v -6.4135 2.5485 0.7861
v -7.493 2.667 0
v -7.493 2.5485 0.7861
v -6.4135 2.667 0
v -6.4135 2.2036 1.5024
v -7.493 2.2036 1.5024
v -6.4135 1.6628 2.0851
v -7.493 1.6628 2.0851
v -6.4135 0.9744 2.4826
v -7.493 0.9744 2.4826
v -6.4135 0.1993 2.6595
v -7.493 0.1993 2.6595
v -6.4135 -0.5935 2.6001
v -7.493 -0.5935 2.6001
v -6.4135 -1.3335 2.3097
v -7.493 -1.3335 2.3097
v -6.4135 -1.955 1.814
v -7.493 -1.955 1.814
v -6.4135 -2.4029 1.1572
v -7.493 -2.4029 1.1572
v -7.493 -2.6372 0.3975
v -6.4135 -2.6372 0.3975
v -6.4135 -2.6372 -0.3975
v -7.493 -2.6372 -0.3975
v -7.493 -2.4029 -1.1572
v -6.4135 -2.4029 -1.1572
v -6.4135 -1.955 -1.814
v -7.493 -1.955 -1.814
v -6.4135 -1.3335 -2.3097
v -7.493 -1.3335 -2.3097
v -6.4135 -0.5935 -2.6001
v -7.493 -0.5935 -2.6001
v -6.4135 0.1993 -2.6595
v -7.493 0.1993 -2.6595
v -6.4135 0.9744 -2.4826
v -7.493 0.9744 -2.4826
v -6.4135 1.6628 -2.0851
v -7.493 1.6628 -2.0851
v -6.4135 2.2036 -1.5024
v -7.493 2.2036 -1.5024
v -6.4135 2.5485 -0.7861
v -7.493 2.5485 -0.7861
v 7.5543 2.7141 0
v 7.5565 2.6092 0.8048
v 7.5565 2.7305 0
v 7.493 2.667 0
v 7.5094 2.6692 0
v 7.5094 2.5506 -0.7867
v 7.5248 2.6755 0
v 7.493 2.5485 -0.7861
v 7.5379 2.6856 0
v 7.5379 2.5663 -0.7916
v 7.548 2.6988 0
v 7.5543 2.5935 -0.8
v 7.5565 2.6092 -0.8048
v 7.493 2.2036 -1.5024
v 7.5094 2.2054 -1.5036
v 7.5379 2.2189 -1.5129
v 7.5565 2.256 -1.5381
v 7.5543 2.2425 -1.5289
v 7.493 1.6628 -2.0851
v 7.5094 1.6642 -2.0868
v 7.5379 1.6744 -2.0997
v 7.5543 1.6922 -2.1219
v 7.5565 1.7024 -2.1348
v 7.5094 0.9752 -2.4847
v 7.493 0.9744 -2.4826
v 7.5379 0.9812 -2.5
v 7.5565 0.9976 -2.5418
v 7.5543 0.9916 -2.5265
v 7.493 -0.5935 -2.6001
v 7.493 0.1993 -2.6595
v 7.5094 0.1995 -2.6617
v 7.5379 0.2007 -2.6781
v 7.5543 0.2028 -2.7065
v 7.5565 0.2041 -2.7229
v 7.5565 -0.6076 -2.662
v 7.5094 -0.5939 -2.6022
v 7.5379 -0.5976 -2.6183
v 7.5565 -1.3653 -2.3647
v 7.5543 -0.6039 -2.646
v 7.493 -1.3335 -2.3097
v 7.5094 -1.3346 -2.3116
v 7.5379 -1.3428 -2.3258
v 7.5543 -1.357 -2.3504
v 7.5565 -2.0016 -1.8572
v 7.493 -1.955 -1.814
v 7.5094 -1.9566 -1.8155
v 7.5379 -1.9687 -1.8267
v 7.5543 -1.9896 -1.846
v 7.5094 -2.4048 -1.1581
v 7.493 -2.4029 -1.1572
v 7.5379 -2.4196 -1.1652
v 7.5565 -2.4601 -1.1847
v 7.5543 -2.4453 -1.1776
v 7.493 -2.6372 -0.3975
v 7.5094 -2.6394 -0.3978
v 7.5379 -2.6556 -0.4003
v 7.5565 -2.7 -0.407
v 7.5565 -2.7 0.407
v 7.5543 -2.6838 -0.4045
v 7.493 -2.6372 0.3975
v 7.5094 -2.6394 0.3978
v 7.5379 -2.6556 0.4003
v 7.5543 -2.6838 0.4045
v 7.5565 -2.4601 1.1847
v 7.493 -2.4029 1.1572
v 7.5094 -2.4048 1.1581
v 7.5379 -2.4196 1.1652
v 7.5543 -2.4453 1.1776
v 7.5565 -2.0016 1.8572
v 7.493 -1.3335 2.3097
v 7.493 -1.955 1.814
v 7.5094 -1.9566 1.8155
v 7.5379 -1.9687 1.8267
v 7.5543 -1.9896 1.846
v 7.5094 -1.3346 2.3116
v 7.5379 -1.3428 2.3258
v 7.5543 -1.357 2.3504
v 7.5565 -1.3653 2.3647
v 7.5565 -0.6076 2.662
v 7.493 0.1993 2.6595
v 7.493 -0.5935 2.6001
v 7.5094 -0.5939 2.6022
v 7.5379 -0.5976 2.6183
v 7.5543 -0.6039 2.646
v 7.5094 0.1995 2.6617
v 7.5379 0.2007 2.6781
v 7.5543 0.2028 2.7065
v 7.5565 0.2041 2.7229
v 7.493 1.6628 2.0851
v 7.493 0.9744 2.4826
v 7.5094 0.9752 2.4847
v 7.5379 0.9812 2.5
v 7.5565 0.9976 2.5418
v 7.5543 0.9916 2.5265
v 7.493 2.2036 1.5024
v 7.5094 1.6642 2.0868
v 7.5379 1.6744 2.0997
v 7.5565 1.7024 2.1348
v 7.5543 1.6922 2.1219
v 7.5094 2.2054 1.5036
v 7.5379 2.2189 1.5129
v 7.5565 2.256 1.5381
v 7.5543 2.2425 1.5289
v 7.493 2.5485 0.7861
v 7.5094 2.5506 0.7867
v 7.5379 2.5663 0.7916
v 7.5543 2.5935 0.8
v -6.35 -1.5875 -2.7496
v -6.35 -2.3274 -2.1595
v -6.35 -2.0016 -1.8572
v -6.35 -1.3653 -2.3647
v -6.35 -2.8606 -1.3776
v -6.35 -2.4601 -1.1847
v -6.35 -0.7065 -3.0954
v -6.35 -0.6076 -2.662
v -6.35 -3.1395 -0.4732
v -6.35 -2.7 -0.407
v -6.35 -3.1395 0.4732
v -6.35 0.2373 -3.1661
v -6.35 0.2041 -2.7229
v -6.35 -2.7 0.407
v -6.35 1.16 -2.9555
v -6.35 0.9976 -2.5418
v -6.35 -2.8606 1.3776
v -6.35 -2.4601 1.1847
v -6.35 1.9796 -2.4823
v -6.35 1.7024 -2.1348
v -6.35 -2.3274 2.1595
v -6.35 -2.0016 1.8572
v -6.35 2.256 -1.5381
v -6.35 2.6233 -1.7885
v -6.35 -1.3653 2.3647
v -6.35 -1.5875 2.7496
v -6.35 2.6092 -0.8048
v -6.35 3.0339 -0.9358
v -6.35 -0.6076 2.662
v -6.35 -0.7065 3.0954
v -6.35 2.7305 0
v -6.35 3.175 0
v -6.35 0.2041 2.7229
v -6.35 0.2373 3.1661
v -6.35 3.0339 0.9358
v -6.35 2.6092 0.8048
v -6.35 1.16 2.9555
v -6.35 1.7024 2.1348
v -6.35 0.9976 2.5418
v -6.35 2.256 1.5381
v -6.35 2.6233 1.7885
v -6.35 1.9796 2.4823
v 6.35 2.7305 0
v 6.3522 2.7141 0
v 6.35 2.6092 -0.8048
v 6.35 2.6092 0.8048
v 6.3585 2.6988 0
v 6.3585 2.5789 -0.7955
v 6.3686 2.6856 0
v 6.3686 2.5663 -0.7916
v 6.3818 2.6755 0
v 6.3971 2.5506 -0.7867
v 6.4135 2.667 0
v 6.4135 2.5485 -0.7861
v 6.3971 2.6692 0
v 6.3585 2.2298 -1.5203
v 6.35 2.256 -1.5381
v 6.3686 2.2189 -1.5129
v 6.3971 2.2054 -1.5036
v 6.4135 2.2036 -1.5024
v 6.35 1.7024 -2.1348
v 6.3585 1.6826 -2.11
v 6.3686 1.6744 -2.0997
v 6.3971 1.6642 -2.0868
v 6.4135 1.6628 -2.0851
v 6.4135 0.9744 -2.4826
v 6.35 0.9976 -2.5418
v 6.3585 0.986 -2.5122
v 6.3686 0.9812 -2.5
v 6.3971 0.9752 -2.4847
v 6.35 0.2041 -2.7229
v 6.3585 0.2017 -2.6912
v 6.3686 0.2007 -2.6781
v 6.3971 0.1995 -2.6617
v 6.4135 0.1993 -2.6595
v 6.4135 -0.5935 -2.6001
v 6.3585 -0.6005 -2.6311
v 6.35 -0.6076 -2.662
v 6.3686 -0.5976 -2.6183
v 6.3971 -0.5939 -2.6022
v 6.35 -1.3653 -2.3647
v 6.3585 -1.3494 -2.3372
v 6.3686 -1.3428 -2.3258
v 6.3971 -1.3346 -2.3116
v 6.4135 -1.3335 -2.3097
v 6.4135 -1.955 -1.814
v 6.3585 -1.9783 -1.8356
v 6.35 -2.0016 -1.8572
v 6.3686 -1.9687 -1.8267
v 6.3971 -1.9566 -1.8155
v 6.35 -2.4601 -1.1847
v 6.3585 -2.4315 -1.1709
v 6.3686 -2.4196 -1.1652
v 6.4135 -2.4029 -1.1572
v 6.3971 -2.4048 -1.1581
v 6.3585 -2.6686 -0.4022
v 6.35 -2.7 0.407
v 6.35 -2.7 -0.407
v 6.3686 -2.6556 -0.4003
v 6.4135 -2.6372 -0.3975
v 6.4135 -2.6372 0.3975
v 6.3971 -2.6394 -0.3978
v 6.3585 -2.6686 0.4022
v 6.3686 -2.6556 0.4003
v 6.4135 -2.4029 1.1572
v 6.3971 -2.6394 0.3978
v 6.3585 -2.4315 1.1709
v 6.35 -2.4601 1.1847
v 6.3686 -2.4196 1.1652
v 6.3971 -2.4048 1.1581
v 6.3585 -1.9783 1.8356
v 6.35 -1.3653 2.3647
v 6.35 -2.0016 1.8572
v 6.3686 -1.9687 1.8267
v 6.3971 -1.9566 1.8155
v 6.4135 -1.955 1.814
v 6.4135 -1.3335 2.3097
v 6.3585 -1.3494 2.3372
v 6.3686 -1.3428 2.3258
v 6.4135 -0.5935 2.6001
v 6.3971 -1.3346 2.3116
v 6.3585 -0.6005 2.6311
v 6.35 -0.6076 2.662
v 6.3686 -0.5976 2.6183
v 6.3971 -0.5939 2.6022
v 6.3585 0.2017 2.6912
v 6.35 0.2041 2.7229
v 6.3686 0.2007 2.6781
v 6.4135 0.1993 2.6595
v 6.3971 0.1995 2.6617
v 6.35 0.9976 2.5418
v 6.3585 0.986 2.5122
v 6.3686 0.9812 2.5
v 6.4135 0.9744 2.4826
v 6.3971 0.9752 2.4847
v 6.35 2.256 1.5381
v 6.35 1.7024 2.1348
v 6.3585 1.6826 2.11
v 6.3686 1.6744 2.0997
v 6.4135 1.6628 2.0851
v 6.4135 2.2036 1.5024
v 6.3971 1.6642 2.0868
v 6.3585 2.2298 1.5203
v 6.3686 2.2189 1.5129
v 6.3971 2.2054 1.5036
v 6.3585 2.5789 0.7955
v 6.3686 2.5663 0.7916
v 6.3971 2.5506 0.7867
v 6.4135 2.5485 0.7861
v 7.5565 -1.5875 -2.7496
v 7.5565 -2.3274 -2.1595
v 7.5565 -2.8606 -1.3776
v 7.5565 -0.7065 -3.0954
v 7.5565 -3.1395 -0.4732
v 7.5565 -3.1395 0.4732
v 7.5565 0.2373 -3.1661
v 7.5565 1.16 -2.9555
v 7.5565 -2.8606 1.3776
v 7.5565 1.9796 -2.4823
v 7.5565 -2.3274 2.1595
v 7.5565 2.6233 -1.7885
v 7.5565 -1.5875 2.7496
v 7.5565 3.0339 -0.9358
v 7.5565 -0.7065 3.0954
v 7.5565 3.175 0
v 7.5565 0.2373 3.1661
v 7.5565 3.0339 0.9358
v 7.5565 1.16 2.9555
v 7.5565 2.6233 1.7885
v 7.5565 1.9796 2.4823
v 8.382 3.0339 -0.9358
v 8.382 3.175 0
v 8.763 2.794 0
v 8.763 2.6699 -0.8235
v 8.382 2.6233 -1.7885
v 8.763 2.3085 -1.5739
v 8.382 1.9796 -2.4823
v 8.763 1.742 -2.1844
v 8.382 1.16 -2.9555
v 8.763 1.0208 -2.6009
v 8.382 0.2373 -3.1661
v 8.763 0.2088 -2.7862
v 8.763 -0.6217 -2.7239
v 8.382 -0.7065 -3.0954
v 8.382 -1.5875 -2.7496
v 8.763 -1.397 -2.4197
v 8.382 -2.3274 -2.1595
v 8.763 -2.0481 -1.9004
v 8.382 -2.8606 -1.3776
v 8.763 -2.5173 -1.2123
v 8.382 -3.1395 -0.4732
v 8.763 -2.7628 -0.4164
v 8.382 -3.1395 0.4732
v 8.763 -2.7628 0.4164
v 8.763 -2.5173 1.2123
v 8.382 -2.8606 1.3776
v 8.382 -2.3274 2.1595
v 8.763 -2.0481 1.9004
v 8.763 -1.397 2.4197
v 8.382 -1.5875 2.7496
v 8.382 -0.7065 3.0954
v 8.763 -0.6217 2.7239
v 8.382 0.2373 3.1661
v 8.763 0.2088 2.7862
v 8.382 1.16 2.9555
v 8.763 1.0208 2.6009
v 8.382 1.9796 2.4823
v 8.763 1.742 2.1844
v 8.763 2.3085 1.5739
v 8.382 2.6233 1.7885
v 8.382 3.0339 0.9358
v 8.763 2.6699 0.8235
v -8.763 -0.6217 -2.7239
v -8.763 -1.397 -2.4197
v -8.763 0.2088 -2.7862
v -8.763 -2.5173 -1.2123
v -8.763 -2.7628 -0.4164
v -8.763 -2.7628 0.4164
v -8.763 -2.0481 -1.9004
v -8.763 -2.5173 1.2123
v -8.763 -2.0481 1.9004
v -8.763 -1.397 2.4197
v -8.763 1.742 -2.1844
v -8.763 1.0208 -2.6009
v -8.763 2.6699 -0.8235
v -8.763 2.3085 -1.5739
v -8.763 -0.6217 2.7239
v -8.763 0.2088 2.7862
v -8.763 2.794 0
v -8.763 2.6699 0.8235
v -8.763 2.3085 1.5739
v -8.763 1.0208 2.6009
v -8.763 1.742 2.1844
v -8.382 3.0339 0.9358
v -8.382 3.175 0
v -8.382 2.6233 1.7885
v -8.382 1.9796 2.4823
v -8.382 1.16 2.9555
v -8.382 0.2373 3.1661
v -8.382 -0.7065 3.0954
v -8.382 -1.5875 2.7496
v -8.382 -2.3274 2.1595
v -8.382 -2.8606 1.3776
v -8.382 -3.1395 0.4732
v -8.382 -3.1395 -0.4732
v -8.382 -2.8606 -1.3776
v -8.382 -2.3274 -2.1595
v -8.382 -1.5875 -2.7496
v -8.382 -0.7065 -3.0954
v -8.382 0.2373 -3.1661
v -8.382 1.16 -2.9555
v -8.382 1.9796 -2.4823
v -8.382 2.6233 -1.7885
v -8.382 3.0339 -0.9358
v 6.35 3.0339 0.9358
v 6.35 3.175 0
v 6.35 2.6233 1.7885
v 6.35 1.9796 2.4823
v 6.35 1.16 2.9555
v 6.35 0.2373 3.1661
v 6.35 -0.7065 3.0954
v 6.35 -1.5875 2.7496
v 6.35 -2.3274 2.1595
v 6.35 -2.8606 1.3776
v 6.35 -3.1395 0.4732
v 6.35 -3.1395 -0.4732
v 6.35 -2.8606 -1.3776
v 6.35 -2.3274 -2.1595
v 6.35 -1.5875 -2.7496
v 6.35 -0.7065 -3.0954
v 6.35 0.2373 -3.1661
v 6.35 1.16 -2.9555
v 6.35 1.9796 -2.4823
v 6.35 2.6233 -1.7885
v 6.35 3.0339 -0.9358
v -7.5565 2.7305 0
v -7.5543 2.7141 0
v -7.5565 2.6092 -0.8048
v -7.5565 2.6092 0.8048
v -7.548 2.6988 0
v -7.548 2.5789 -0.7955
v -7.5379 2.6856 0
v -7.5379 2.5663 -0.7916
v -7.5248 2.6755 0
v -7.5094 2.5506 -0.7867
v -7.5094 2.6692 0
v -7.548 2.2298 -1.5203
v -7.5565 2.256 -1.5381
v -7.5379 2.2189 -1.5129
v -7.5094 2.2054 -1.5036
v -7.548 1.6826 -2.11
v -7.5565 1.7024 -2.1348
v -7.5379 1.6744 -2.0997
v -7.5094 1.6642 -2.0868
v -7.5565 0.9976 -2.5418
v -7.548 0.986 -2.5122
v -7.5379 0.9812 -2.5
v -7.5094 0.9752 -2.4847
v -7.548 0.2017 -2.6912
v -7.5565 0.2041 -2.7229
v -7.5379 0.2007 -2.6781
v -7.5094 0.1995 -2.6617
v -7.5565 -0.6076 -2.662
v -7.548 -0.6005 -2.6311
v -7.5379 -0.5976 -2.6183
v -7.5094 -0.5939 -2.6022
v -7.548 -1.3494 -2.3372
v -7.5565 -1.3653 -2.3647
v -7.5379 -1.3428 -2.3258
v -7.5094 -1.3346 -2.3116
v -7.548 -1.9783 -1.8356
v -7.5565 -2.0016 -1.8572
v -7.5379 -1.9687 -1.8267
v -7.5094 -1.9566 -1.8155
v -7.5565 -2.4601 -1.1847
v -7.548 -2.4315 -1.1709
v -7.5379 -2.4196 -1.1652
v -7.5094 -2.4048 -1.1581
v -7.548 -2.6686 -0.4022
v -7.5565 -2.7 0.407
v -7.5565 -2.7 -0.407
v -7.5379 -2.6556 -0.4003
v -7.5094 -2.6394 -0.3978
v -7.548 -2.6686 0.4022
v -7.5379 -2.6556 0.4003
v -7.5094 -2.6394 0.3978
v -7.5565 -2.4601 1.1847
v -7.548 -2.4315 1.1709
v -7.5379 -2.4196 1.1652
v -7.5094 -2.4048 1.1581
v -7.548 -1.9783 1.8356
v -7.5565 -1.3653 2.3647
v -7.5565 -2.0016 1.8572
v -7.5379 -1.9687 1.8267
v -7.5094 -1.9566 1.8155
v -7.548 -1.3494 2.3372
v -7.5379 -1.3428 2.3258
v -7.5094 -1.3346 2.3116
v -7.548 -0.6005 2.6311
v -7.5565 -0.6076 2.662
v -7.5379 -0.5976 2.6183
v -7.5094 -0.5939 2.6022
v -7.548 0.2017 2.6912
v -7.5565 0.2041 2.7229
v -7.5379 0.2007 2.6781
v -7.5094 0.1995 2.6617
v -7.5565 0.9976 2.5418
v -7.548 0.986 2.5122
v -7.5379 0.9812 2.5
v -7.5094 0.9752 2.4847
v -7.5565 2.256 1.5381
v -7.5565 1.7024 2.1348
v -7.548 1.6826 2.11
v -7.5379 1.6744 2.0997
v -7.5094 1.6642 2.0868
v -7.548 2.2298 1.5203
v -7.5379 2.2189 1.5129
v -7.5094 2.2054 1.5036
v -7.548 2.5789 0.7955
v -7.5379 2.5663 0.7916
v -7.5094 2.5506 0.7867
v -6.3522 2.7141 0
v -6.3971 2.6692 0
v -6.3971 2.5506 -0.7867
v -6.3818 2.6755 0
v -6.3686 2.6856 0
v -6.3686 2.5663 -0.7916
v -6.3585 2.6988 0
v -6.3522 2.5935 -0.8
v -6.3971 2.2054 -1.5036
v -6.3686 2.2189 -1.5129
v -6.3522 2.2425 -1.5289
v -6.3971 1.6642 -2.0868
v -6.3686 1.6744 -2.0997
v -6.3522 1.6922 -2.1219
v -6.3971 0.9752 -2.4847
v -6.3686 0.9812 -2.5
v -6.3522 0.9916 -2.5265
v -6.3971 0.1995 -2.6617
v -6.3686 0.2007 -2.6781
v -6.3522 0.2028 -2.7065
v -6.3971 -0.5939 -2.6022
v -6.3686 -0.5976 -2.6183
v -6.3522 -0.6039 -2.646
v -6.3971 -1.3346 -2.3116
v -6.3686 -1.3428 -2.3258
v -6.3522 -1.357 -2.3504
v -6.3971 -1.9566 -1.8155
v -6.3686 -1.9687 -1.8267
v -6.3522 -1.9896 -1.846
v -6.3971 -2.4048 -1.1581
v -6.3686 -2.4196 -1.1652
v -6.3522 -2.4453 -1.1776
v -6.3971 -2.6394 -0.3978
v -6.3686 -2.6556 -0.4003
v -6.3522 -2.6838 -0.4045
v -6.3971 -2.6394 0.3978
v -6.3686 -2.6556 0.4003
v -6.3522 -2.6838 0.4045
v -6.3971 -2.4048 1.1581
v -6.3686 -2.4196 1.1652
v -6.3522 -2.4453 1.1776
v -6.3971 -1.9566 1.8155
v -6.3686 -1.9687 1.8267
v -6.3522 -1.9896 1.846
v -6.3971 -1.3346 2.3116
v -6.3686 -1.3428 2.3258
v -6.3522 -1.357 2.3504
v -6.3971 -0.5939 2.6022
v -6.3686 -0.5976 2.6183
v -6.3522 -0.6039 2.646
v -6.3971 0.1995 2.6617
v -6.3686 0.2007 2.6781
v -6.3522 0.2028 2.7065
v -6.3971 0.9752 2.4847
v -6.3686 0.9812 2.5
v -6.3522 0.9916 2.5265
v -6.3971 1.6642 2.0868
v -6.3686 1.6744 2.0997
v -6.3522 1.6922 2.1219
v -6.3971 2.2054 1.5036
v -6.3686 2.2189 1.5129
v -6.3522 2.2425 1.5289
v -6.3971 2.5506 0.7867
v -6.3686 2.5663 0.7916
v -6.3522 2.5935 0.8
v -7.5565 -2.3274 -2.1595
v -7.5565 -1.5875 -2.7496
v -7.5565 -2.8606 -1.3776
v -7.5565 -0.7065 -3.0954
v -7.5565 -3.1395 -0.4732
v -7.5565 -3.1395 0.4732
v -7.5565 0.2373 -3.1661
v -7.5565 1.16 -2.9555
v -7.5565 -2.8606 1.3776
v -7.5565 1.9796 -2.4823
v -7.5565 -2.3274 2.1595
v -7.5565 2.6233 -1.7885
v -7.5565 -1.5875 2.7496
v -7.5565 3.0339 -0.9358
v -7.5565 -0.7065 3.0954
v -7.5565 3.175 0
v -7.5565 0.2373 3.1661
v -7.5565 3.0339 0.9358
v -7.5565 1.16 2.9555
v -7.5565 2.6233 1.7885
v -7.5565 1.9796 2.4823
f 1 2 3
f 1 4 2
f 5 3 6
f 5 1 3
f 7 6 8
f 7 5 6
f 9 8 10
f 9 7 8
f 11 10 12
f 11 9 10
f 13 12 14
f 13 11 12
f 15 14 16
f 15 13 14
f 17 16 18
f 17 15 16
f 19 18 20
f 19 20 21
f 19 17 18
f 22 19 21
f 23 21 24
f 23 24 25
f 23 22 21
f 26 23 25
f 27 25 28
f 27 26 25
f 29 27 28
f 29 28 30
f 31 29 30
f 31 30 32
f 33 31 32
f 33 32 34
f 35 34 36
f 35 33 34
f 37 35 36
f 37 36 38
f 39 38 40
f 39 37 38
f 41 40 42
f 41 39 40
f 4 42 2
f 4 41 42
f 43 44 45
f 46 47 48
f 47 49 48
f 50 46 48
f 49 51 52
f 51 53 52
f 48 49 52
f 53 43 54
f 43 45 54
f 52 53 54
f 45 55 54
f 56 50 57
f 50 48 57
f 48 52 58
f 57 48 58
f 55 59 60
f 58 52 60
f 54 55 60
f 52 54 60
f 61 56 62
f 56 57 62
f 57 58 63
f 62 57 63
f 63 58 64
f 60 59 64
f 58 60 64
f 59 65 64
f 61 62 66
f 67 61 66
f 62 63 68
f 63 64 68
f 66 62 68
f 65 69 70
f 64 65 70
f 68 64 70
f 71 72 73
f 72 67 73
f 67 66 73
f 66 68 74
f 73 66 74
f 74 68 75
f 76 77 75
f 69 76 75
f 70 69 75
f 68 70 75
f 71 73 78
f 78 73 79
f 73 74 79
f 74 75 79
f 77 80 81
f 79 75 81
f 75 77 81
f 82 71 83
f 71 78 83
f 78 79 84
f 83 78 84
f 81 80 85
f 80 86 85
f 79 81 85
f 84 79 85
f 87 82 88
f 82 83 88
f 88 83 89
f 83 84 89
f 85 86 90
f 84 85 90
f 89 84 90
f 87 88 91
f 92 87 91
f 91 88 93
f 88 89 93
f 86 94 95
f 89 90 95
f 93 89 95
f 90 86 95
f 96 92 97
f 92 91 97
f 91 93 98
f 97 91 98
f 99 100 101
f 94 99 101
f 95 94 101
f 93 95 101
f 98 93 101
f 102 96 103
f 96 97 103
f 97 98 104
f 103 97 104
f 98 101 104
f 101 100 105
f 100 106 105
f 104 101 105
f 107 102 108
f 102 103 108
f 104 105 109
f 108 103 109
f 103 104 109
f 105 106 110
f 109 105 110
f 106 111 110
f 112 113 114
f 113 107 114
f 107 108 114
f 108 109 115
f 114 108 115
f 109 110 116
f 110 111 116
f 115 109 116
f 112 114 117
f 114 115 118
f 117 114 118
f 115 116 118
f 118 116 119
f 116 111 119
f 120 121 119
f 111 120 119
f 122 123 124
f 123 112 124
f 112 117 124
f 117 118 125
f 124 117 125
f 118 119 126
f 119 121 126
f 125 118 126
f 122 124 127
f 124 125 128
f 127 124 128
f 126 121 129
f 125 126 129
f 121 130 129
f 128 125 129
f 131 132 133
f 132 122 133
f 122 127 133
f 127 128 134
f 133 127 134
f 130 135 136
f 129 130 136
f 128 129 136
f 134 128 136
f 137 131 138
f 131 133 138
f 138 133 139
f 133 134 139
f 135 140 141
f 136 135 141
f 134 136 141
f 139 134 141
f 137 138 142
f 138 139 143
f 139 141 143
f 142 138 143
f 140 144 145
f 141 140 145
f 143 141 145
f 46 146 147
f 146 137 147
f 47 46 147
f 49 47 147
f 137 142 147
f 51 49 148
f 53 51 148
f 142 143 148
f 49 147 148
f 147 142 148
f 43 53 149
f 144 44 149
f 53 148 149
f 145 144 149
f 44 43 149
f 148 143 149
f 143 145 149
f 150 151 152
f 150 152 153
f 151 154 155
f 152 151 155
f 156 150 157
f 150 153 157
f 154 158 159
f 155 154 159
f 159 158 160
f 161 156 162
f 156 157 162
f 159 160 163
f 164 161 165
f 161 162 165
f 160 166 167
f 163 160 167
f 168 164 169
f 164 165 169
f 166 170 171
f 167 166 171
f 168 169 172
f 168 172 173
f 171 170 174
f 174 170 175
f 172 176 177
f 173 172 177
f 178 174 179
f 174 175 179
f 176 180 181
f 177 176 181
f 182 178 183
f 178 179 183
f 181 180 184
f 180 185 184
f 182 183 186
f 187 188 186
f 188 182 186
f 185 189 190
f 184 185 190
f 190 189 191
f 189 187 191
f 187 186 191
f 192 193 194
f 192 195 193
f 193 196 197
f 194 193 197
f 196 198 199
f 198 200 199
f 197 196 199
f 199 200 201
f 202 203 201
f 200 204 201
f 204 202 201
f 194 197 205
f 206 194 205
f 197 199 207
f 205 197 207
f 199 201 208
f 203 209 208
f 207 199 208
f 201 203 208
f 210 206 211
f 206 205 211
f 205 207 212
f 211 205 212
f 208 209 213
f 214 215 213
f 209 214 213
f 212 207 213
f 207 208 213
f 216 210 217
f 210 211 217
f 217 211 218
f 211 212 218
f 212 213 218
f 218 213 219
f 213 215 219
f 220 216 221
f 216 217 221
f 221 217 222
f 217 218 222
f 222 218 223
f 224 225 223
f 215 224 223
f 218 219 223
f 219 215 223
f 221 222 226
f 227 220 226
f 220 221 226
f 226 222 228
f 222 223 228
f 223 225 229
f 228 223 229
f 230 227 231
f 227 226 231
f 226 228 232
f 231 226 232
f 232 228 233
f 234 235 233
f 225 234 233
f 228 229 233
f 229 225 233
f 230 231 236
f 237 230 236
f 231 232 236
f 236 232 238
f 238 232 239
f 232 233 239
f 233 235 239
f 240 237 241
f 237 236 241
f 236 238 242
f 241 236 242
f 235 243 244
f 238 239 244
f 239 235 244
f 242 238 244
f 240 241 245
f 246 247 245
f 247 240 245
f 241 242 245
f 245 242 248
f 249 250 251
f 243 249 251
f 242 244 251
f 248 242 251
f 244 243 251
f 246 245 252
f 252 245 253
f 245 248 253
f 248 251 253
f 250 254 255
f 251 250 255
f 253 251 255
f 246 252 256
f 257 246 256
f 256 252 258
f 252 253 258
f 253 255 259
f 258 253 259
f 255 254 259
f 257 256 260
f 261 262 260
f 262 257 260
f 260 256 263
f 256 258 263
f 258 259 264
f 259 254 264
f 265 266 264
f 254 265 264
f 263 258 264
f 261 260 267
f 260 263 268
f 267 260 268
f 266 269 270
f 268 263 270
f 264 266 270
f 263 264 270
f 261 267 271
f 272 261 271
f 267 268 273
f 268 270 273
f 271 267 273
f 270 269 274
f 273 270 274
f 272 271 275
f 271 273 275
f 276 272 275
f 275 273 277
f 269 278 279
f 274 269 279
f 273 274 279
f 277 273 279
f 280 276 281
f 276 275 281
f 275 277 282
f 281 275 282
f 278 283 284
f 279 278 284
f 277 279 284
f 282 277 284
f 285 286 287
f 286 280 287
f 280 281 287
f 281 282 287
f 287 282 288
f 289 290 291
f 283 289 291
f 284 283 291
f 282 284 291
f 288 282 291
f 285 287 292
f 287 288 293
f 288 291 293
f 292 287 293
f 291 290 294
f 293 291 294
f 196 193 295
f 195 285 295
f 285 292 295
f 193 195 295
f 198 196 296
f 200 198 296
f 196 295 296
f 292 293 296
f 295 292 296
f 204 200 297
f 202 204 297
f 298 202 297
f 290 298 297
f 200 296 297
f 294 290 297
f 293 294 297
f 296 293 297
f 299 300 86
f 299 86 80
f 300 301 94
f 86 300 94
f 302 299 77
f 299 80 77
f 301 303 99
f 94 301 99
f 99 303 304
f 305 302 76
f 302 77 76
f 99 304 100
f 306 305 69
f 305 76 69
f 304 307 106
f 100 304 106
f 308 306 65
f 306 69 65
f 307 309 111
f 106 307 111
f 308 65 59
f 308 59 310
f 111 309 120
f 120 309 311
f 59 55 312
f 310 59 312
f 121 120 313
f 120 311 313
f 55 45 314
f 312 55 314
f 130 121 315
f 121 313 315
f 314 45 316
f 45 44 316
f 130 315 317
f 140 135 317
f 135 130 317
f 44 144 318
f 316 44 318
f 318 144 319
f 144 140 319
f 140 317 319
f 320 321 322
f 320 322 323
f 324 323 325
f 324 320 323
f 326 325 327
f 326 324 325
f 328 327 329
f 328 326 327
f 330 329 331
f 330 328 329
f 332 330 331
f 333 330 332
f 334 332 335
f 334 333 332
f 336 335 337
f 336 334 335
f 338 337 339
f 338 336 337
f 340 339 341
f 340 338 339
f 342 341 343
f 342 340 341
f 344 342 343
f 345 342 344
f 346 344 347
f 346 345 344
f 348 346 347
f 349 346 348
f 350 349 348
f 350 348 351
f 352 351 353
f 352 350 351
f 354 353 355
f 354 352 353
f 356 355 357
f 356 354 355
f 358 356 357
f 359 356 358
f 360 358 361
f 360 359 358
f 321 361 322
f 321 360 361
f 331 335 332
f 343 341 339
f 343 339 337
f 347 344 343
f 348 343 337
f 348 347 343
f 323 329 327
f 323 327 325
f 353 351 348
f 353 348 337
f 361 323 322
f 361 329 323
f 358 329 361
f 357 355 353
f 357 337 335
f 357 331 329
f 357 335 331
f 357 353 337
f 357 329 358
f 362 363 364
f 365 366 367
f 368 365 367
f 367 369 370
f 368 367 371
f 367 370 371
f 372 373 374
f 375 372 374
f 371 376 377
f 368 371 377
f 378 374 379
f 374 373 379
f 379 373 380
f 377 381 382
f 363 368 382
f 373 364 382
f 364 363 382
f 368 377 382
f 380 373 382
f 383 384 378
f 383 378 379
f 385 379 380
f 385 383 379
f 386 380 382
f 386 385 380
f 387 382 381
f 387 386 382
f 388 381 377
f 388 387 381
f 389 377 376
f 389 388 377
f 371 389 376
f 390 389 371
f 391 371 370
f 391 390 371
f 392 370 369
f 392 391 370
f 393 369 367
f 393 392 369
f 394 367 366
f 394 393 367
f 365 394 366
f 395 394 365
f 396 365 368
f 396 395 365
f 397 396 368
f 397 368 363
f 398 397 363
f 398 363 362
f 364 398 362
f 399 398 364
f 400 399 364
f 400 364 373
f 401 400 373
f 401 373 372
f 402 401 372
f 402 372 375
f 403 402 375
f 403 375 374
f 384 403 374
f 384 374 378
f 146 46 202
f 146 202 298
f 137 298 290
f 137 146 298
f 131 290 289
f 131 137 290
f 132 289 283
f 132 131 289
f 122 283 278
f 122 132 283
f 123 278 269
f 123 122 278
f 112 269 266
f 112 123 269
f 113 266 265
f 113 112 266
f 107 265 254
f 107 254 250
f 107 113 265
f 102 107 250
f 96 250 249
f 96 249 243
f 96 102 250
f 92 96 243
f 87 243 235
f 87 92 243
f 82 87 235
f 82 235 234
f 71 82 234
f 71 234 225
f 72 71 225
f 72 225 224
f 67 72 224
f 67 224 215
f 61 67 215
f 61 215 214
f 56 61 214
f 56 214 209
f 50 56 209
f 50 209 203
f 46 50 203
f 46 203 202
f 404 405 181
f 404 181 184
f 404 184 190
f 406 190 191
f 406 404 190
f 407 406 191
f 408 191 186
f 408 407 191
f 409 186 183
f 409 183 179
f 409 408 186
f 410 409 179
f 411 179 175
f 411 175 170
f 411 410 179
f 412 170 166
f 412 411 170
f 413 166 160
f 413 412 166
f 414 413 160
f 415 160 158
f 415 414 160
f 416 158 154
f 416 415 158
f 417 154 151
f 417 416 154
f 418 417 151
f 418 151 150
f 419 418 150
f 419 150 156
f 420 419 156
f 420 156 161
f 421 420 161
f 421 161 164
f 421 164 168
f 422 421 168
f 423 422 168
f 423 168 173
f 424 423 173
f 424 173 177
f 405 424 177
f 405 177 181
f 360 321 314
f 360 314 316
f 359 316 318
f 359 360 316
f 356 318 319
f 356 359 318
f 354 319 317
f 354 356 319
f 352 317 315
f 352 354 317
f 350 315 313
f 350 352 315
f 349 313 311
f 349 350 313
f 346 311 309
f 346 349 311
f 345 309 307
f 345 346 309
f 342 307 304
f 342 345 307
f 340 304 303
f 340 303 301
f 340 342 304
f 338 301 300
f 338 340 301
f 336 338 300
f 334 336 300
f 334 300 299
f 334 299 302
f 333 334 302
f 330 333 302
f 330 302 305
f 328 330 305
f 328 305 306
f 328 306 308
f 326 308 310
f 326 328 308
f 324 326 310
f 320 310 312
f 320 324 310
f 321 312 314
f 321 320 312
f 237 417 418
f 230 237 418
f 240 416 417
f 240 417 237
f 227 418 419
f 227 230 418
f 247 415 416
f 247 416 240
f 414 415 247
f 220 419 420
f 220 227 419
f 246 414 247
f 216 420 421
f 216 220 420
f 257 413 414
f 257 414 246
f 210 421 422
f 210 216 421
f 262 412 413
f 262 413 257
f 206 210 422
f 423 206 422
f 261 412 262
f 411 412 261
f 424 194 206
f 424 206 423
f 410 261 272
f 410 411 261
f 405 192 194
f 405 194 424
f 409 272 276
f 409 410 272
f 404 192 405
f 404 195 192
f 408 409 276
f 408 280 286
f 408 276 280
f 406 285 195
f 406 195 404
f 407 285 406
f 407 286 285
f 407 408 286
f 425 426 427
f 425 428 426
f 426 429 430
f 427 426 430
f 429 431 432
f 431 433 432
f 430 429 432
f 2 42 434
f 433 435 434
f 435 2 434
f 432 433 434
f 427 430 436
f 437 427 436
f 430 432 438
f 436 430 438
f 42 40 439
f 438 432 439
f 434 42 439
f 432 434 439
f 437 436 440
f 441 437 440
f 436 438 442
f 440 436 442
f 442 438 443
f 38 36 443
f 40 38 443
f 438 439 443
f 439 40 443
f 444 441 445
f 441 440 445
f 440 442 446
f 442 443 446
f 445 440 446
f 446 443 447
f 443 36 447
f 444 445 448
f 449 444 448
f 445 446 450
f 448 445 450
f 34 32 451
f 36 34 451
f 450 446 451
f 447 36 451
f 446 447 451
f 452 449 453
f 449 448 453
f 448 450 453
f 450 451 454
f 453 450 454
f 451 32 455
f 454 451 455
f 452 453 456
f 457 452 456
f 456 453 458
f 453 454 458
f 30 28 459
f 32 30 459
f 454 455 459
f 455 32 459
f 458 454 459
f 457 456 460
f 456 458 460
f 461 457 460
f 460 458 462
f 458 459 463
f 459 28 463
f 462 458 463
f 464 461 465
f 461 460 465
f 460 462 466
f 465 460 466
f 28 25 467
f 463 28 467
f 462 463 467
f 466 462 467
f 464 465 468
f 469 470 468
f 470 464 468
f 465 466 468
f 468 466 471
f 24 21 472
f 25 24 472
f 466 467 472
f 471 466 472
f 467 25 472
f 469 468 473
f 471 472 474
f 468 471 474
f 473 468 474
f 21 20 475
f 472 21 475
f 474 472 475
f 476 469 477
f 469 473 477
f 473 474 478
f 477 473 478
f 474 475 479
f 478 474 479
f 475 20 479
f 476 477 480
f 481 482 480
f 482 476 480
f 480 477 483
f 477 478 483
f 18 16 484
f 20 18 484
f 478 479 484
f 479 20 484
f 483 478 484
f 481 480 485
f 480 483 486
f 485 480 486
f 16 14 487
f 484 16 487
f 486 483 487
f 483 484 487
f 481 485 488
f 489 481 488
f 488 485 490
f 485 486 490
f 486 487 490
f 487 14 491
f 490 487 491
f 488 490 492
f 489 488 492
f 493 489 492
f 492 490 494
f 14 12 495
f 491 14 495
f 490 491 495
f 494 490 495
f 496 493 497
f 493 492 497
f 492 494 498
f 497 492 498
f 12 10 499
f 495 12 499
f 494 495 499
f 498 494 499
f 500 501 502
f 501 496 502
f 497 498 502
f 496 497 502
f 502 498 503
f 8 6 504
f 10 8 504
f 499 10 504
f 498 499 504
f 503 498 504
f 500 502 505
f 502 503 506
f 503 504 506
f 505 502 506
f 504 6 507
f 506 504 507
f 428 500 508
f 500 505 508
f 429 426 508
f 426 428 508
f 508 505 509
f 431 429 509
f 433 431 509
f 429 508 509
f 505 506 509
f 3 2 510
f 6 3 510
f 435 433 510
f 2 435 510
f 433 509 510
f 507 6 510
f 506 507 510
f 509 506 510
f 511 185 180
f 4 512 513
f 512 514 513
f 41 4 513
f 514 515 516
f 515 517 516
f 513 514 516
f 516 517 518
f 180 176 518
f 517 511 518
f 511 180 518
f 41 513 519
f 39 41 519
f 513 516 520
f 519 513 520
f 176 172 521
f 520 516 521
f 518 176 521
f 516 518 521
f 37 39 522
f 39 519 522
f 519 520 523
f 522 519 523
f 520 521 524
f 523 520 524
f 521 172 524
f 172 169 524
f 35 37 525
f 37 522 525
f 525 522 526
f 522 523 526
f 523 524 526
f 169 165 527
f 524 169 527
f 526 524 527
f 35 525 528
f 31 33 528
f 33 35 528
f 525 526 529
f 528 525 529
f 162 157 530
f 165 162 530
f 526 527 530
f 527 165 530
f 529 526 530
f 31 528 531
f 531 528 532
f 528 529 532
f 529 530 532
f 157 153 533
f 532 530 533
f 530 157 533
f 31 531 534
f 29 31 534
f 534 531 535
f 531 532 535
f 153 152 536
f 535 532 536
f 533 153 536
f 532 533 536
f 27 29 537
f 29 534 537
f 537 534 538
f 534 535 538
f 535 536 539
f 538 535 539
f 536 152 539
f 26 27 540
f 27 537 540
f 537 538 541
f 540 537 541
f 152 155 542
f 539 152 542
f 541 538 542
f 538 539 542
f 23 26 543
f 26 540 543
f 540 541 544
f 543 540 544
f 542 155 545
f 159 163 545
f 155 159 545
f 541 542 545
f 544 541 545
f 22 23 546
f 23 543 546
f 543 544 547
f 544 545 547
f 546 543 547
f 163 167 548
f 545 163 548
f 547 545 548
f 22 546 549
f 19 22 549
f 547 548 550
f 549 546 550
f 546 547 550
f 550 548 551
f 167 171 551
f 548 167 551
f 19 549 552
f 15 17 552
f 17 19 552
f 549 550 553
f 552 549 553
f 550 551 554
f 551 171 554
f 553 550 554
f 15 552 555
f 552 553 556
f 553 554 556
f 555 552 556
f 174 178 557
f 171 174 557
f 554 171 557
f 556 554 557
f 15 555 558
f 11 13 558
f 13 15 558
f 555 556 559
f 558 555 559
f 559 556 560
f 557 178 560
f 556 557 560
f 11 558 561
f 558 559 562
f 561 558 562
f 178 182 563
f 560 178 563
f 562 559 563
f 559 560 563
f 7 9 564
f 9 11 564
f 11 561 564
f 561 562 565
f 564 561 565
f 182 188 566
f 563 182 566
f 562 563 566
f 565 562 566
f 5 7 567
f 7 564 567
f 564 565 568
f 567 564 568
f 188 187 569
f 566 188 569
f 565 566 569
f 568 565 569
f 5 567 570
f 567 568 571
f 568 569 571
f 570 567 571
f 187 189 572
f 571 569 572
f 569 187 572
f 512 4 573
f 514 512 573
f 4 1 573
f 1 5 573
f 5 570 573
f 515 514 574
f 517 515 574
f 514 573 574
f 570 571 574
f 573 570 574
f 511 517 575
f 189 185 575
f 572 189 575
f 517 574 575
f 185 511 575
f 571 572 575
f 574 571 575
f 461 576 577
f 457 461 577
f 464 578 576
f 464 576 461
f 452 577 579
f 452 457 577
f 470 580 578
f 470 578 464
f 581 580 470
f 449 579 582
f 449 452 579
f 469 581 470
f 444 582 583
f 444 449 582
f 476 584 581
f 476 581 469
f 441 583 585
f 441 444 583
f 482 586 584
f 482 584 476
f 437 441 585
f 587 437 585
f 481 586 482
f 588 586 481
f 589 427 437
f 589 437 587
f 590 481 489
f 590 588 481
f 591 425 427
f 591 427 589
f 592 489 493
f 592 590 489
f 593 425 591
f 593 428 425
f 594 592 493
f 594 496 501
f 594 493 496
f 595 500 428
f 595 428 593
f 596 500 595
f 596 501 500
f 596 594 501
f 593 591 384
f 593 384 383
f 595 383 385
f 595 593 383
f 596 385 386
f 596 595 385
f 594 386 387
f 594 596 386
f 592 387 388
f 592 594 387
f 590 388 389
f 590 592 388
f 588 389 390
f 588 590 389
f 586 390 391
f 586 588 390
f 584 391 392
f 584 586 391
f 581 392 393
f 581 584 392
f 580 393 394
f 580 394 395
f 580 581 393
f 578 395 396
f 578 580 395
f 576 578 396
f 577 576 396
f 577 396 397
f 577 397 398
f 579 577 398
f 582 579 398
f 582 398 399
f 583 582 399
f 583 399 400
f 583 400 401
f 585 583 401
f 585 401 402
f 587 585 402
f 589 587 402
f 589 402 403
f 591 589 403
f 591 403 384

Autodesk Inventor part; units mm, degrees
sketch "Sketch_1" plane through (0, 0, 0) normal (0, 0, 1) x (1, 0, 0)
  line L0 (8.763, 0) -> (-8.763, 0)
  line L1 (-8.763, 0) -> (-8.763, 2.794)
  line L2 (-8.763, 2.794) -> (-8.382, 3.175)
  line L3 (-8.382, 3.175) -> (-7.5565, 3.175)
  line L4 (-7.5565, 3.175) -> (-7.5565, 2.7305)
  arc A0 (-7.5565, 2.7305) -> (-7.493, 2.667) centre (-7.493, 2.7305) ccw
  line L5 (-7.493, 2.667) -> (-6.4135, 2.667)
  arc A1 (-6.4135, 2.667) -> (-6.35, 2.7305) centre (-6.4135, 2.7305) ccw
  line L6 (-6.35, 2.7305) -> (-6.35, 3.175)
  line L7 (-6.35, 3.175) -> (6.35, 3.175)
  line L8 (6.35, 3.175) -> (6.35, 2.7305)
  arc A2 (6.35, 2.7305) -> (6.4135, 2.667) centre (6.4135, 2.7305) ccw
  line L9 (6.4135, 2.667) -> (7.493, 2.667)
  arc A3 (7.493, 2.667) -> (7.5565, 2.7305) centre (7.493, 2.7305) ccw
  line L10 (7.5565, 2.7305) -> (7.5565, 3.175)
  line L11 (7.5565, 3.175) -> (8.382, 3.175)
  line L12 (8.382, 3.175) -> (8.763, 2.794)
  line L13 (8.763, 2.794) -> (8.763, 0)
  line L14 (8.763, 0) -> (-8.763, 0)
revolve "Revolution1" add sketch "Sketch_1" angle 360 about axis through (8.763, 0, 0) along (1, 0, 0)
ref_plane "pin_XY" through (0, 0, 0) normal (1, 0, 0) x (0, 0, -1)
ref_plane "pin_YZ" through (0, 0, 0) normal (0, 0, -1) x (0, 1, 0)
ref_plane "pin_ZX" through (0, 0, 0) normal (0, 1, 0) x (1, 0, 0)
ref_plane "rr1_XY" through (6.9532, 0, 0) normal (1, 0, 0) x (0, 0, -1)
ref_plane "rr1_YZ" through (6.9532, 0, 0) normal (0, 0, -1) x (0, 1, 0)
ref_plane "rr1_ZX" through (6.9532, 0, 0) normal (0, 1, 0) x (1, 0, 0)
ref_plane "rr2_XY" through (-6.9532, 0, 0) normal (1, 0, 0) x (0, 0, -1)
ref_plane "rr2_YZ" through (-6.9532, 0, 0) normal (0, 0, -1) x (0, 1, 0)
ref_plane "rr2_ZX" through (-6.9532, 0, 0) normal (0, 1, 0) x (1, 0, 0)
ref_plane "w21_XY" through (8.763, 0, 0) normal (0, 1, 0) x (1, 0, 0)
ref_plane "w21_YZ" through (8.763, 0, 0) normal (1, 0, 0) x (0, 0, -1)
ref_plane "w21_ZX" through (8.763, 0, 0) normal (0, 0, -1) x (0, 1, 0)
ref_plane "w22_XY" through (-8.763, 0, 0) normal (0, 1, 0) x (1, 0, 0)
ref_plane "w22_YZ" through (-8.763, 0, 0) normal (1, 0, 0) x (0, 0, -1)
ref_plane "w22_ZX" through (-8.763, 0, 0) normal (0, 0, -1) x (0, 1, 0)
ref_plane "p1_XY" through (0, 0, 3.175) normal (1, 0, 0) x (0, 0, -1)
ref_plane "p1_YZ" through (0, 0, 3.175) normal (0, 0, -1) x (0, 1, 0)
ref_plane "p1_ZX" through (0, 0, 3.175) normal (0, 1, 0) x (1, 0, 0)
ref_plane "p2_XY" through (0, 0, -3.175) normal (1, 0, 0) x (0, 0, -1)
ref_plane "p2_YZ" through (0, 0, -3.175) normal (0, 0, -1) x (0, 1, 0)
ref_plane "p2_ZX" through (0, 0, -3.175) normal (0, 1, 0) x (1, 0, 0)
properties part number "D-8381"
